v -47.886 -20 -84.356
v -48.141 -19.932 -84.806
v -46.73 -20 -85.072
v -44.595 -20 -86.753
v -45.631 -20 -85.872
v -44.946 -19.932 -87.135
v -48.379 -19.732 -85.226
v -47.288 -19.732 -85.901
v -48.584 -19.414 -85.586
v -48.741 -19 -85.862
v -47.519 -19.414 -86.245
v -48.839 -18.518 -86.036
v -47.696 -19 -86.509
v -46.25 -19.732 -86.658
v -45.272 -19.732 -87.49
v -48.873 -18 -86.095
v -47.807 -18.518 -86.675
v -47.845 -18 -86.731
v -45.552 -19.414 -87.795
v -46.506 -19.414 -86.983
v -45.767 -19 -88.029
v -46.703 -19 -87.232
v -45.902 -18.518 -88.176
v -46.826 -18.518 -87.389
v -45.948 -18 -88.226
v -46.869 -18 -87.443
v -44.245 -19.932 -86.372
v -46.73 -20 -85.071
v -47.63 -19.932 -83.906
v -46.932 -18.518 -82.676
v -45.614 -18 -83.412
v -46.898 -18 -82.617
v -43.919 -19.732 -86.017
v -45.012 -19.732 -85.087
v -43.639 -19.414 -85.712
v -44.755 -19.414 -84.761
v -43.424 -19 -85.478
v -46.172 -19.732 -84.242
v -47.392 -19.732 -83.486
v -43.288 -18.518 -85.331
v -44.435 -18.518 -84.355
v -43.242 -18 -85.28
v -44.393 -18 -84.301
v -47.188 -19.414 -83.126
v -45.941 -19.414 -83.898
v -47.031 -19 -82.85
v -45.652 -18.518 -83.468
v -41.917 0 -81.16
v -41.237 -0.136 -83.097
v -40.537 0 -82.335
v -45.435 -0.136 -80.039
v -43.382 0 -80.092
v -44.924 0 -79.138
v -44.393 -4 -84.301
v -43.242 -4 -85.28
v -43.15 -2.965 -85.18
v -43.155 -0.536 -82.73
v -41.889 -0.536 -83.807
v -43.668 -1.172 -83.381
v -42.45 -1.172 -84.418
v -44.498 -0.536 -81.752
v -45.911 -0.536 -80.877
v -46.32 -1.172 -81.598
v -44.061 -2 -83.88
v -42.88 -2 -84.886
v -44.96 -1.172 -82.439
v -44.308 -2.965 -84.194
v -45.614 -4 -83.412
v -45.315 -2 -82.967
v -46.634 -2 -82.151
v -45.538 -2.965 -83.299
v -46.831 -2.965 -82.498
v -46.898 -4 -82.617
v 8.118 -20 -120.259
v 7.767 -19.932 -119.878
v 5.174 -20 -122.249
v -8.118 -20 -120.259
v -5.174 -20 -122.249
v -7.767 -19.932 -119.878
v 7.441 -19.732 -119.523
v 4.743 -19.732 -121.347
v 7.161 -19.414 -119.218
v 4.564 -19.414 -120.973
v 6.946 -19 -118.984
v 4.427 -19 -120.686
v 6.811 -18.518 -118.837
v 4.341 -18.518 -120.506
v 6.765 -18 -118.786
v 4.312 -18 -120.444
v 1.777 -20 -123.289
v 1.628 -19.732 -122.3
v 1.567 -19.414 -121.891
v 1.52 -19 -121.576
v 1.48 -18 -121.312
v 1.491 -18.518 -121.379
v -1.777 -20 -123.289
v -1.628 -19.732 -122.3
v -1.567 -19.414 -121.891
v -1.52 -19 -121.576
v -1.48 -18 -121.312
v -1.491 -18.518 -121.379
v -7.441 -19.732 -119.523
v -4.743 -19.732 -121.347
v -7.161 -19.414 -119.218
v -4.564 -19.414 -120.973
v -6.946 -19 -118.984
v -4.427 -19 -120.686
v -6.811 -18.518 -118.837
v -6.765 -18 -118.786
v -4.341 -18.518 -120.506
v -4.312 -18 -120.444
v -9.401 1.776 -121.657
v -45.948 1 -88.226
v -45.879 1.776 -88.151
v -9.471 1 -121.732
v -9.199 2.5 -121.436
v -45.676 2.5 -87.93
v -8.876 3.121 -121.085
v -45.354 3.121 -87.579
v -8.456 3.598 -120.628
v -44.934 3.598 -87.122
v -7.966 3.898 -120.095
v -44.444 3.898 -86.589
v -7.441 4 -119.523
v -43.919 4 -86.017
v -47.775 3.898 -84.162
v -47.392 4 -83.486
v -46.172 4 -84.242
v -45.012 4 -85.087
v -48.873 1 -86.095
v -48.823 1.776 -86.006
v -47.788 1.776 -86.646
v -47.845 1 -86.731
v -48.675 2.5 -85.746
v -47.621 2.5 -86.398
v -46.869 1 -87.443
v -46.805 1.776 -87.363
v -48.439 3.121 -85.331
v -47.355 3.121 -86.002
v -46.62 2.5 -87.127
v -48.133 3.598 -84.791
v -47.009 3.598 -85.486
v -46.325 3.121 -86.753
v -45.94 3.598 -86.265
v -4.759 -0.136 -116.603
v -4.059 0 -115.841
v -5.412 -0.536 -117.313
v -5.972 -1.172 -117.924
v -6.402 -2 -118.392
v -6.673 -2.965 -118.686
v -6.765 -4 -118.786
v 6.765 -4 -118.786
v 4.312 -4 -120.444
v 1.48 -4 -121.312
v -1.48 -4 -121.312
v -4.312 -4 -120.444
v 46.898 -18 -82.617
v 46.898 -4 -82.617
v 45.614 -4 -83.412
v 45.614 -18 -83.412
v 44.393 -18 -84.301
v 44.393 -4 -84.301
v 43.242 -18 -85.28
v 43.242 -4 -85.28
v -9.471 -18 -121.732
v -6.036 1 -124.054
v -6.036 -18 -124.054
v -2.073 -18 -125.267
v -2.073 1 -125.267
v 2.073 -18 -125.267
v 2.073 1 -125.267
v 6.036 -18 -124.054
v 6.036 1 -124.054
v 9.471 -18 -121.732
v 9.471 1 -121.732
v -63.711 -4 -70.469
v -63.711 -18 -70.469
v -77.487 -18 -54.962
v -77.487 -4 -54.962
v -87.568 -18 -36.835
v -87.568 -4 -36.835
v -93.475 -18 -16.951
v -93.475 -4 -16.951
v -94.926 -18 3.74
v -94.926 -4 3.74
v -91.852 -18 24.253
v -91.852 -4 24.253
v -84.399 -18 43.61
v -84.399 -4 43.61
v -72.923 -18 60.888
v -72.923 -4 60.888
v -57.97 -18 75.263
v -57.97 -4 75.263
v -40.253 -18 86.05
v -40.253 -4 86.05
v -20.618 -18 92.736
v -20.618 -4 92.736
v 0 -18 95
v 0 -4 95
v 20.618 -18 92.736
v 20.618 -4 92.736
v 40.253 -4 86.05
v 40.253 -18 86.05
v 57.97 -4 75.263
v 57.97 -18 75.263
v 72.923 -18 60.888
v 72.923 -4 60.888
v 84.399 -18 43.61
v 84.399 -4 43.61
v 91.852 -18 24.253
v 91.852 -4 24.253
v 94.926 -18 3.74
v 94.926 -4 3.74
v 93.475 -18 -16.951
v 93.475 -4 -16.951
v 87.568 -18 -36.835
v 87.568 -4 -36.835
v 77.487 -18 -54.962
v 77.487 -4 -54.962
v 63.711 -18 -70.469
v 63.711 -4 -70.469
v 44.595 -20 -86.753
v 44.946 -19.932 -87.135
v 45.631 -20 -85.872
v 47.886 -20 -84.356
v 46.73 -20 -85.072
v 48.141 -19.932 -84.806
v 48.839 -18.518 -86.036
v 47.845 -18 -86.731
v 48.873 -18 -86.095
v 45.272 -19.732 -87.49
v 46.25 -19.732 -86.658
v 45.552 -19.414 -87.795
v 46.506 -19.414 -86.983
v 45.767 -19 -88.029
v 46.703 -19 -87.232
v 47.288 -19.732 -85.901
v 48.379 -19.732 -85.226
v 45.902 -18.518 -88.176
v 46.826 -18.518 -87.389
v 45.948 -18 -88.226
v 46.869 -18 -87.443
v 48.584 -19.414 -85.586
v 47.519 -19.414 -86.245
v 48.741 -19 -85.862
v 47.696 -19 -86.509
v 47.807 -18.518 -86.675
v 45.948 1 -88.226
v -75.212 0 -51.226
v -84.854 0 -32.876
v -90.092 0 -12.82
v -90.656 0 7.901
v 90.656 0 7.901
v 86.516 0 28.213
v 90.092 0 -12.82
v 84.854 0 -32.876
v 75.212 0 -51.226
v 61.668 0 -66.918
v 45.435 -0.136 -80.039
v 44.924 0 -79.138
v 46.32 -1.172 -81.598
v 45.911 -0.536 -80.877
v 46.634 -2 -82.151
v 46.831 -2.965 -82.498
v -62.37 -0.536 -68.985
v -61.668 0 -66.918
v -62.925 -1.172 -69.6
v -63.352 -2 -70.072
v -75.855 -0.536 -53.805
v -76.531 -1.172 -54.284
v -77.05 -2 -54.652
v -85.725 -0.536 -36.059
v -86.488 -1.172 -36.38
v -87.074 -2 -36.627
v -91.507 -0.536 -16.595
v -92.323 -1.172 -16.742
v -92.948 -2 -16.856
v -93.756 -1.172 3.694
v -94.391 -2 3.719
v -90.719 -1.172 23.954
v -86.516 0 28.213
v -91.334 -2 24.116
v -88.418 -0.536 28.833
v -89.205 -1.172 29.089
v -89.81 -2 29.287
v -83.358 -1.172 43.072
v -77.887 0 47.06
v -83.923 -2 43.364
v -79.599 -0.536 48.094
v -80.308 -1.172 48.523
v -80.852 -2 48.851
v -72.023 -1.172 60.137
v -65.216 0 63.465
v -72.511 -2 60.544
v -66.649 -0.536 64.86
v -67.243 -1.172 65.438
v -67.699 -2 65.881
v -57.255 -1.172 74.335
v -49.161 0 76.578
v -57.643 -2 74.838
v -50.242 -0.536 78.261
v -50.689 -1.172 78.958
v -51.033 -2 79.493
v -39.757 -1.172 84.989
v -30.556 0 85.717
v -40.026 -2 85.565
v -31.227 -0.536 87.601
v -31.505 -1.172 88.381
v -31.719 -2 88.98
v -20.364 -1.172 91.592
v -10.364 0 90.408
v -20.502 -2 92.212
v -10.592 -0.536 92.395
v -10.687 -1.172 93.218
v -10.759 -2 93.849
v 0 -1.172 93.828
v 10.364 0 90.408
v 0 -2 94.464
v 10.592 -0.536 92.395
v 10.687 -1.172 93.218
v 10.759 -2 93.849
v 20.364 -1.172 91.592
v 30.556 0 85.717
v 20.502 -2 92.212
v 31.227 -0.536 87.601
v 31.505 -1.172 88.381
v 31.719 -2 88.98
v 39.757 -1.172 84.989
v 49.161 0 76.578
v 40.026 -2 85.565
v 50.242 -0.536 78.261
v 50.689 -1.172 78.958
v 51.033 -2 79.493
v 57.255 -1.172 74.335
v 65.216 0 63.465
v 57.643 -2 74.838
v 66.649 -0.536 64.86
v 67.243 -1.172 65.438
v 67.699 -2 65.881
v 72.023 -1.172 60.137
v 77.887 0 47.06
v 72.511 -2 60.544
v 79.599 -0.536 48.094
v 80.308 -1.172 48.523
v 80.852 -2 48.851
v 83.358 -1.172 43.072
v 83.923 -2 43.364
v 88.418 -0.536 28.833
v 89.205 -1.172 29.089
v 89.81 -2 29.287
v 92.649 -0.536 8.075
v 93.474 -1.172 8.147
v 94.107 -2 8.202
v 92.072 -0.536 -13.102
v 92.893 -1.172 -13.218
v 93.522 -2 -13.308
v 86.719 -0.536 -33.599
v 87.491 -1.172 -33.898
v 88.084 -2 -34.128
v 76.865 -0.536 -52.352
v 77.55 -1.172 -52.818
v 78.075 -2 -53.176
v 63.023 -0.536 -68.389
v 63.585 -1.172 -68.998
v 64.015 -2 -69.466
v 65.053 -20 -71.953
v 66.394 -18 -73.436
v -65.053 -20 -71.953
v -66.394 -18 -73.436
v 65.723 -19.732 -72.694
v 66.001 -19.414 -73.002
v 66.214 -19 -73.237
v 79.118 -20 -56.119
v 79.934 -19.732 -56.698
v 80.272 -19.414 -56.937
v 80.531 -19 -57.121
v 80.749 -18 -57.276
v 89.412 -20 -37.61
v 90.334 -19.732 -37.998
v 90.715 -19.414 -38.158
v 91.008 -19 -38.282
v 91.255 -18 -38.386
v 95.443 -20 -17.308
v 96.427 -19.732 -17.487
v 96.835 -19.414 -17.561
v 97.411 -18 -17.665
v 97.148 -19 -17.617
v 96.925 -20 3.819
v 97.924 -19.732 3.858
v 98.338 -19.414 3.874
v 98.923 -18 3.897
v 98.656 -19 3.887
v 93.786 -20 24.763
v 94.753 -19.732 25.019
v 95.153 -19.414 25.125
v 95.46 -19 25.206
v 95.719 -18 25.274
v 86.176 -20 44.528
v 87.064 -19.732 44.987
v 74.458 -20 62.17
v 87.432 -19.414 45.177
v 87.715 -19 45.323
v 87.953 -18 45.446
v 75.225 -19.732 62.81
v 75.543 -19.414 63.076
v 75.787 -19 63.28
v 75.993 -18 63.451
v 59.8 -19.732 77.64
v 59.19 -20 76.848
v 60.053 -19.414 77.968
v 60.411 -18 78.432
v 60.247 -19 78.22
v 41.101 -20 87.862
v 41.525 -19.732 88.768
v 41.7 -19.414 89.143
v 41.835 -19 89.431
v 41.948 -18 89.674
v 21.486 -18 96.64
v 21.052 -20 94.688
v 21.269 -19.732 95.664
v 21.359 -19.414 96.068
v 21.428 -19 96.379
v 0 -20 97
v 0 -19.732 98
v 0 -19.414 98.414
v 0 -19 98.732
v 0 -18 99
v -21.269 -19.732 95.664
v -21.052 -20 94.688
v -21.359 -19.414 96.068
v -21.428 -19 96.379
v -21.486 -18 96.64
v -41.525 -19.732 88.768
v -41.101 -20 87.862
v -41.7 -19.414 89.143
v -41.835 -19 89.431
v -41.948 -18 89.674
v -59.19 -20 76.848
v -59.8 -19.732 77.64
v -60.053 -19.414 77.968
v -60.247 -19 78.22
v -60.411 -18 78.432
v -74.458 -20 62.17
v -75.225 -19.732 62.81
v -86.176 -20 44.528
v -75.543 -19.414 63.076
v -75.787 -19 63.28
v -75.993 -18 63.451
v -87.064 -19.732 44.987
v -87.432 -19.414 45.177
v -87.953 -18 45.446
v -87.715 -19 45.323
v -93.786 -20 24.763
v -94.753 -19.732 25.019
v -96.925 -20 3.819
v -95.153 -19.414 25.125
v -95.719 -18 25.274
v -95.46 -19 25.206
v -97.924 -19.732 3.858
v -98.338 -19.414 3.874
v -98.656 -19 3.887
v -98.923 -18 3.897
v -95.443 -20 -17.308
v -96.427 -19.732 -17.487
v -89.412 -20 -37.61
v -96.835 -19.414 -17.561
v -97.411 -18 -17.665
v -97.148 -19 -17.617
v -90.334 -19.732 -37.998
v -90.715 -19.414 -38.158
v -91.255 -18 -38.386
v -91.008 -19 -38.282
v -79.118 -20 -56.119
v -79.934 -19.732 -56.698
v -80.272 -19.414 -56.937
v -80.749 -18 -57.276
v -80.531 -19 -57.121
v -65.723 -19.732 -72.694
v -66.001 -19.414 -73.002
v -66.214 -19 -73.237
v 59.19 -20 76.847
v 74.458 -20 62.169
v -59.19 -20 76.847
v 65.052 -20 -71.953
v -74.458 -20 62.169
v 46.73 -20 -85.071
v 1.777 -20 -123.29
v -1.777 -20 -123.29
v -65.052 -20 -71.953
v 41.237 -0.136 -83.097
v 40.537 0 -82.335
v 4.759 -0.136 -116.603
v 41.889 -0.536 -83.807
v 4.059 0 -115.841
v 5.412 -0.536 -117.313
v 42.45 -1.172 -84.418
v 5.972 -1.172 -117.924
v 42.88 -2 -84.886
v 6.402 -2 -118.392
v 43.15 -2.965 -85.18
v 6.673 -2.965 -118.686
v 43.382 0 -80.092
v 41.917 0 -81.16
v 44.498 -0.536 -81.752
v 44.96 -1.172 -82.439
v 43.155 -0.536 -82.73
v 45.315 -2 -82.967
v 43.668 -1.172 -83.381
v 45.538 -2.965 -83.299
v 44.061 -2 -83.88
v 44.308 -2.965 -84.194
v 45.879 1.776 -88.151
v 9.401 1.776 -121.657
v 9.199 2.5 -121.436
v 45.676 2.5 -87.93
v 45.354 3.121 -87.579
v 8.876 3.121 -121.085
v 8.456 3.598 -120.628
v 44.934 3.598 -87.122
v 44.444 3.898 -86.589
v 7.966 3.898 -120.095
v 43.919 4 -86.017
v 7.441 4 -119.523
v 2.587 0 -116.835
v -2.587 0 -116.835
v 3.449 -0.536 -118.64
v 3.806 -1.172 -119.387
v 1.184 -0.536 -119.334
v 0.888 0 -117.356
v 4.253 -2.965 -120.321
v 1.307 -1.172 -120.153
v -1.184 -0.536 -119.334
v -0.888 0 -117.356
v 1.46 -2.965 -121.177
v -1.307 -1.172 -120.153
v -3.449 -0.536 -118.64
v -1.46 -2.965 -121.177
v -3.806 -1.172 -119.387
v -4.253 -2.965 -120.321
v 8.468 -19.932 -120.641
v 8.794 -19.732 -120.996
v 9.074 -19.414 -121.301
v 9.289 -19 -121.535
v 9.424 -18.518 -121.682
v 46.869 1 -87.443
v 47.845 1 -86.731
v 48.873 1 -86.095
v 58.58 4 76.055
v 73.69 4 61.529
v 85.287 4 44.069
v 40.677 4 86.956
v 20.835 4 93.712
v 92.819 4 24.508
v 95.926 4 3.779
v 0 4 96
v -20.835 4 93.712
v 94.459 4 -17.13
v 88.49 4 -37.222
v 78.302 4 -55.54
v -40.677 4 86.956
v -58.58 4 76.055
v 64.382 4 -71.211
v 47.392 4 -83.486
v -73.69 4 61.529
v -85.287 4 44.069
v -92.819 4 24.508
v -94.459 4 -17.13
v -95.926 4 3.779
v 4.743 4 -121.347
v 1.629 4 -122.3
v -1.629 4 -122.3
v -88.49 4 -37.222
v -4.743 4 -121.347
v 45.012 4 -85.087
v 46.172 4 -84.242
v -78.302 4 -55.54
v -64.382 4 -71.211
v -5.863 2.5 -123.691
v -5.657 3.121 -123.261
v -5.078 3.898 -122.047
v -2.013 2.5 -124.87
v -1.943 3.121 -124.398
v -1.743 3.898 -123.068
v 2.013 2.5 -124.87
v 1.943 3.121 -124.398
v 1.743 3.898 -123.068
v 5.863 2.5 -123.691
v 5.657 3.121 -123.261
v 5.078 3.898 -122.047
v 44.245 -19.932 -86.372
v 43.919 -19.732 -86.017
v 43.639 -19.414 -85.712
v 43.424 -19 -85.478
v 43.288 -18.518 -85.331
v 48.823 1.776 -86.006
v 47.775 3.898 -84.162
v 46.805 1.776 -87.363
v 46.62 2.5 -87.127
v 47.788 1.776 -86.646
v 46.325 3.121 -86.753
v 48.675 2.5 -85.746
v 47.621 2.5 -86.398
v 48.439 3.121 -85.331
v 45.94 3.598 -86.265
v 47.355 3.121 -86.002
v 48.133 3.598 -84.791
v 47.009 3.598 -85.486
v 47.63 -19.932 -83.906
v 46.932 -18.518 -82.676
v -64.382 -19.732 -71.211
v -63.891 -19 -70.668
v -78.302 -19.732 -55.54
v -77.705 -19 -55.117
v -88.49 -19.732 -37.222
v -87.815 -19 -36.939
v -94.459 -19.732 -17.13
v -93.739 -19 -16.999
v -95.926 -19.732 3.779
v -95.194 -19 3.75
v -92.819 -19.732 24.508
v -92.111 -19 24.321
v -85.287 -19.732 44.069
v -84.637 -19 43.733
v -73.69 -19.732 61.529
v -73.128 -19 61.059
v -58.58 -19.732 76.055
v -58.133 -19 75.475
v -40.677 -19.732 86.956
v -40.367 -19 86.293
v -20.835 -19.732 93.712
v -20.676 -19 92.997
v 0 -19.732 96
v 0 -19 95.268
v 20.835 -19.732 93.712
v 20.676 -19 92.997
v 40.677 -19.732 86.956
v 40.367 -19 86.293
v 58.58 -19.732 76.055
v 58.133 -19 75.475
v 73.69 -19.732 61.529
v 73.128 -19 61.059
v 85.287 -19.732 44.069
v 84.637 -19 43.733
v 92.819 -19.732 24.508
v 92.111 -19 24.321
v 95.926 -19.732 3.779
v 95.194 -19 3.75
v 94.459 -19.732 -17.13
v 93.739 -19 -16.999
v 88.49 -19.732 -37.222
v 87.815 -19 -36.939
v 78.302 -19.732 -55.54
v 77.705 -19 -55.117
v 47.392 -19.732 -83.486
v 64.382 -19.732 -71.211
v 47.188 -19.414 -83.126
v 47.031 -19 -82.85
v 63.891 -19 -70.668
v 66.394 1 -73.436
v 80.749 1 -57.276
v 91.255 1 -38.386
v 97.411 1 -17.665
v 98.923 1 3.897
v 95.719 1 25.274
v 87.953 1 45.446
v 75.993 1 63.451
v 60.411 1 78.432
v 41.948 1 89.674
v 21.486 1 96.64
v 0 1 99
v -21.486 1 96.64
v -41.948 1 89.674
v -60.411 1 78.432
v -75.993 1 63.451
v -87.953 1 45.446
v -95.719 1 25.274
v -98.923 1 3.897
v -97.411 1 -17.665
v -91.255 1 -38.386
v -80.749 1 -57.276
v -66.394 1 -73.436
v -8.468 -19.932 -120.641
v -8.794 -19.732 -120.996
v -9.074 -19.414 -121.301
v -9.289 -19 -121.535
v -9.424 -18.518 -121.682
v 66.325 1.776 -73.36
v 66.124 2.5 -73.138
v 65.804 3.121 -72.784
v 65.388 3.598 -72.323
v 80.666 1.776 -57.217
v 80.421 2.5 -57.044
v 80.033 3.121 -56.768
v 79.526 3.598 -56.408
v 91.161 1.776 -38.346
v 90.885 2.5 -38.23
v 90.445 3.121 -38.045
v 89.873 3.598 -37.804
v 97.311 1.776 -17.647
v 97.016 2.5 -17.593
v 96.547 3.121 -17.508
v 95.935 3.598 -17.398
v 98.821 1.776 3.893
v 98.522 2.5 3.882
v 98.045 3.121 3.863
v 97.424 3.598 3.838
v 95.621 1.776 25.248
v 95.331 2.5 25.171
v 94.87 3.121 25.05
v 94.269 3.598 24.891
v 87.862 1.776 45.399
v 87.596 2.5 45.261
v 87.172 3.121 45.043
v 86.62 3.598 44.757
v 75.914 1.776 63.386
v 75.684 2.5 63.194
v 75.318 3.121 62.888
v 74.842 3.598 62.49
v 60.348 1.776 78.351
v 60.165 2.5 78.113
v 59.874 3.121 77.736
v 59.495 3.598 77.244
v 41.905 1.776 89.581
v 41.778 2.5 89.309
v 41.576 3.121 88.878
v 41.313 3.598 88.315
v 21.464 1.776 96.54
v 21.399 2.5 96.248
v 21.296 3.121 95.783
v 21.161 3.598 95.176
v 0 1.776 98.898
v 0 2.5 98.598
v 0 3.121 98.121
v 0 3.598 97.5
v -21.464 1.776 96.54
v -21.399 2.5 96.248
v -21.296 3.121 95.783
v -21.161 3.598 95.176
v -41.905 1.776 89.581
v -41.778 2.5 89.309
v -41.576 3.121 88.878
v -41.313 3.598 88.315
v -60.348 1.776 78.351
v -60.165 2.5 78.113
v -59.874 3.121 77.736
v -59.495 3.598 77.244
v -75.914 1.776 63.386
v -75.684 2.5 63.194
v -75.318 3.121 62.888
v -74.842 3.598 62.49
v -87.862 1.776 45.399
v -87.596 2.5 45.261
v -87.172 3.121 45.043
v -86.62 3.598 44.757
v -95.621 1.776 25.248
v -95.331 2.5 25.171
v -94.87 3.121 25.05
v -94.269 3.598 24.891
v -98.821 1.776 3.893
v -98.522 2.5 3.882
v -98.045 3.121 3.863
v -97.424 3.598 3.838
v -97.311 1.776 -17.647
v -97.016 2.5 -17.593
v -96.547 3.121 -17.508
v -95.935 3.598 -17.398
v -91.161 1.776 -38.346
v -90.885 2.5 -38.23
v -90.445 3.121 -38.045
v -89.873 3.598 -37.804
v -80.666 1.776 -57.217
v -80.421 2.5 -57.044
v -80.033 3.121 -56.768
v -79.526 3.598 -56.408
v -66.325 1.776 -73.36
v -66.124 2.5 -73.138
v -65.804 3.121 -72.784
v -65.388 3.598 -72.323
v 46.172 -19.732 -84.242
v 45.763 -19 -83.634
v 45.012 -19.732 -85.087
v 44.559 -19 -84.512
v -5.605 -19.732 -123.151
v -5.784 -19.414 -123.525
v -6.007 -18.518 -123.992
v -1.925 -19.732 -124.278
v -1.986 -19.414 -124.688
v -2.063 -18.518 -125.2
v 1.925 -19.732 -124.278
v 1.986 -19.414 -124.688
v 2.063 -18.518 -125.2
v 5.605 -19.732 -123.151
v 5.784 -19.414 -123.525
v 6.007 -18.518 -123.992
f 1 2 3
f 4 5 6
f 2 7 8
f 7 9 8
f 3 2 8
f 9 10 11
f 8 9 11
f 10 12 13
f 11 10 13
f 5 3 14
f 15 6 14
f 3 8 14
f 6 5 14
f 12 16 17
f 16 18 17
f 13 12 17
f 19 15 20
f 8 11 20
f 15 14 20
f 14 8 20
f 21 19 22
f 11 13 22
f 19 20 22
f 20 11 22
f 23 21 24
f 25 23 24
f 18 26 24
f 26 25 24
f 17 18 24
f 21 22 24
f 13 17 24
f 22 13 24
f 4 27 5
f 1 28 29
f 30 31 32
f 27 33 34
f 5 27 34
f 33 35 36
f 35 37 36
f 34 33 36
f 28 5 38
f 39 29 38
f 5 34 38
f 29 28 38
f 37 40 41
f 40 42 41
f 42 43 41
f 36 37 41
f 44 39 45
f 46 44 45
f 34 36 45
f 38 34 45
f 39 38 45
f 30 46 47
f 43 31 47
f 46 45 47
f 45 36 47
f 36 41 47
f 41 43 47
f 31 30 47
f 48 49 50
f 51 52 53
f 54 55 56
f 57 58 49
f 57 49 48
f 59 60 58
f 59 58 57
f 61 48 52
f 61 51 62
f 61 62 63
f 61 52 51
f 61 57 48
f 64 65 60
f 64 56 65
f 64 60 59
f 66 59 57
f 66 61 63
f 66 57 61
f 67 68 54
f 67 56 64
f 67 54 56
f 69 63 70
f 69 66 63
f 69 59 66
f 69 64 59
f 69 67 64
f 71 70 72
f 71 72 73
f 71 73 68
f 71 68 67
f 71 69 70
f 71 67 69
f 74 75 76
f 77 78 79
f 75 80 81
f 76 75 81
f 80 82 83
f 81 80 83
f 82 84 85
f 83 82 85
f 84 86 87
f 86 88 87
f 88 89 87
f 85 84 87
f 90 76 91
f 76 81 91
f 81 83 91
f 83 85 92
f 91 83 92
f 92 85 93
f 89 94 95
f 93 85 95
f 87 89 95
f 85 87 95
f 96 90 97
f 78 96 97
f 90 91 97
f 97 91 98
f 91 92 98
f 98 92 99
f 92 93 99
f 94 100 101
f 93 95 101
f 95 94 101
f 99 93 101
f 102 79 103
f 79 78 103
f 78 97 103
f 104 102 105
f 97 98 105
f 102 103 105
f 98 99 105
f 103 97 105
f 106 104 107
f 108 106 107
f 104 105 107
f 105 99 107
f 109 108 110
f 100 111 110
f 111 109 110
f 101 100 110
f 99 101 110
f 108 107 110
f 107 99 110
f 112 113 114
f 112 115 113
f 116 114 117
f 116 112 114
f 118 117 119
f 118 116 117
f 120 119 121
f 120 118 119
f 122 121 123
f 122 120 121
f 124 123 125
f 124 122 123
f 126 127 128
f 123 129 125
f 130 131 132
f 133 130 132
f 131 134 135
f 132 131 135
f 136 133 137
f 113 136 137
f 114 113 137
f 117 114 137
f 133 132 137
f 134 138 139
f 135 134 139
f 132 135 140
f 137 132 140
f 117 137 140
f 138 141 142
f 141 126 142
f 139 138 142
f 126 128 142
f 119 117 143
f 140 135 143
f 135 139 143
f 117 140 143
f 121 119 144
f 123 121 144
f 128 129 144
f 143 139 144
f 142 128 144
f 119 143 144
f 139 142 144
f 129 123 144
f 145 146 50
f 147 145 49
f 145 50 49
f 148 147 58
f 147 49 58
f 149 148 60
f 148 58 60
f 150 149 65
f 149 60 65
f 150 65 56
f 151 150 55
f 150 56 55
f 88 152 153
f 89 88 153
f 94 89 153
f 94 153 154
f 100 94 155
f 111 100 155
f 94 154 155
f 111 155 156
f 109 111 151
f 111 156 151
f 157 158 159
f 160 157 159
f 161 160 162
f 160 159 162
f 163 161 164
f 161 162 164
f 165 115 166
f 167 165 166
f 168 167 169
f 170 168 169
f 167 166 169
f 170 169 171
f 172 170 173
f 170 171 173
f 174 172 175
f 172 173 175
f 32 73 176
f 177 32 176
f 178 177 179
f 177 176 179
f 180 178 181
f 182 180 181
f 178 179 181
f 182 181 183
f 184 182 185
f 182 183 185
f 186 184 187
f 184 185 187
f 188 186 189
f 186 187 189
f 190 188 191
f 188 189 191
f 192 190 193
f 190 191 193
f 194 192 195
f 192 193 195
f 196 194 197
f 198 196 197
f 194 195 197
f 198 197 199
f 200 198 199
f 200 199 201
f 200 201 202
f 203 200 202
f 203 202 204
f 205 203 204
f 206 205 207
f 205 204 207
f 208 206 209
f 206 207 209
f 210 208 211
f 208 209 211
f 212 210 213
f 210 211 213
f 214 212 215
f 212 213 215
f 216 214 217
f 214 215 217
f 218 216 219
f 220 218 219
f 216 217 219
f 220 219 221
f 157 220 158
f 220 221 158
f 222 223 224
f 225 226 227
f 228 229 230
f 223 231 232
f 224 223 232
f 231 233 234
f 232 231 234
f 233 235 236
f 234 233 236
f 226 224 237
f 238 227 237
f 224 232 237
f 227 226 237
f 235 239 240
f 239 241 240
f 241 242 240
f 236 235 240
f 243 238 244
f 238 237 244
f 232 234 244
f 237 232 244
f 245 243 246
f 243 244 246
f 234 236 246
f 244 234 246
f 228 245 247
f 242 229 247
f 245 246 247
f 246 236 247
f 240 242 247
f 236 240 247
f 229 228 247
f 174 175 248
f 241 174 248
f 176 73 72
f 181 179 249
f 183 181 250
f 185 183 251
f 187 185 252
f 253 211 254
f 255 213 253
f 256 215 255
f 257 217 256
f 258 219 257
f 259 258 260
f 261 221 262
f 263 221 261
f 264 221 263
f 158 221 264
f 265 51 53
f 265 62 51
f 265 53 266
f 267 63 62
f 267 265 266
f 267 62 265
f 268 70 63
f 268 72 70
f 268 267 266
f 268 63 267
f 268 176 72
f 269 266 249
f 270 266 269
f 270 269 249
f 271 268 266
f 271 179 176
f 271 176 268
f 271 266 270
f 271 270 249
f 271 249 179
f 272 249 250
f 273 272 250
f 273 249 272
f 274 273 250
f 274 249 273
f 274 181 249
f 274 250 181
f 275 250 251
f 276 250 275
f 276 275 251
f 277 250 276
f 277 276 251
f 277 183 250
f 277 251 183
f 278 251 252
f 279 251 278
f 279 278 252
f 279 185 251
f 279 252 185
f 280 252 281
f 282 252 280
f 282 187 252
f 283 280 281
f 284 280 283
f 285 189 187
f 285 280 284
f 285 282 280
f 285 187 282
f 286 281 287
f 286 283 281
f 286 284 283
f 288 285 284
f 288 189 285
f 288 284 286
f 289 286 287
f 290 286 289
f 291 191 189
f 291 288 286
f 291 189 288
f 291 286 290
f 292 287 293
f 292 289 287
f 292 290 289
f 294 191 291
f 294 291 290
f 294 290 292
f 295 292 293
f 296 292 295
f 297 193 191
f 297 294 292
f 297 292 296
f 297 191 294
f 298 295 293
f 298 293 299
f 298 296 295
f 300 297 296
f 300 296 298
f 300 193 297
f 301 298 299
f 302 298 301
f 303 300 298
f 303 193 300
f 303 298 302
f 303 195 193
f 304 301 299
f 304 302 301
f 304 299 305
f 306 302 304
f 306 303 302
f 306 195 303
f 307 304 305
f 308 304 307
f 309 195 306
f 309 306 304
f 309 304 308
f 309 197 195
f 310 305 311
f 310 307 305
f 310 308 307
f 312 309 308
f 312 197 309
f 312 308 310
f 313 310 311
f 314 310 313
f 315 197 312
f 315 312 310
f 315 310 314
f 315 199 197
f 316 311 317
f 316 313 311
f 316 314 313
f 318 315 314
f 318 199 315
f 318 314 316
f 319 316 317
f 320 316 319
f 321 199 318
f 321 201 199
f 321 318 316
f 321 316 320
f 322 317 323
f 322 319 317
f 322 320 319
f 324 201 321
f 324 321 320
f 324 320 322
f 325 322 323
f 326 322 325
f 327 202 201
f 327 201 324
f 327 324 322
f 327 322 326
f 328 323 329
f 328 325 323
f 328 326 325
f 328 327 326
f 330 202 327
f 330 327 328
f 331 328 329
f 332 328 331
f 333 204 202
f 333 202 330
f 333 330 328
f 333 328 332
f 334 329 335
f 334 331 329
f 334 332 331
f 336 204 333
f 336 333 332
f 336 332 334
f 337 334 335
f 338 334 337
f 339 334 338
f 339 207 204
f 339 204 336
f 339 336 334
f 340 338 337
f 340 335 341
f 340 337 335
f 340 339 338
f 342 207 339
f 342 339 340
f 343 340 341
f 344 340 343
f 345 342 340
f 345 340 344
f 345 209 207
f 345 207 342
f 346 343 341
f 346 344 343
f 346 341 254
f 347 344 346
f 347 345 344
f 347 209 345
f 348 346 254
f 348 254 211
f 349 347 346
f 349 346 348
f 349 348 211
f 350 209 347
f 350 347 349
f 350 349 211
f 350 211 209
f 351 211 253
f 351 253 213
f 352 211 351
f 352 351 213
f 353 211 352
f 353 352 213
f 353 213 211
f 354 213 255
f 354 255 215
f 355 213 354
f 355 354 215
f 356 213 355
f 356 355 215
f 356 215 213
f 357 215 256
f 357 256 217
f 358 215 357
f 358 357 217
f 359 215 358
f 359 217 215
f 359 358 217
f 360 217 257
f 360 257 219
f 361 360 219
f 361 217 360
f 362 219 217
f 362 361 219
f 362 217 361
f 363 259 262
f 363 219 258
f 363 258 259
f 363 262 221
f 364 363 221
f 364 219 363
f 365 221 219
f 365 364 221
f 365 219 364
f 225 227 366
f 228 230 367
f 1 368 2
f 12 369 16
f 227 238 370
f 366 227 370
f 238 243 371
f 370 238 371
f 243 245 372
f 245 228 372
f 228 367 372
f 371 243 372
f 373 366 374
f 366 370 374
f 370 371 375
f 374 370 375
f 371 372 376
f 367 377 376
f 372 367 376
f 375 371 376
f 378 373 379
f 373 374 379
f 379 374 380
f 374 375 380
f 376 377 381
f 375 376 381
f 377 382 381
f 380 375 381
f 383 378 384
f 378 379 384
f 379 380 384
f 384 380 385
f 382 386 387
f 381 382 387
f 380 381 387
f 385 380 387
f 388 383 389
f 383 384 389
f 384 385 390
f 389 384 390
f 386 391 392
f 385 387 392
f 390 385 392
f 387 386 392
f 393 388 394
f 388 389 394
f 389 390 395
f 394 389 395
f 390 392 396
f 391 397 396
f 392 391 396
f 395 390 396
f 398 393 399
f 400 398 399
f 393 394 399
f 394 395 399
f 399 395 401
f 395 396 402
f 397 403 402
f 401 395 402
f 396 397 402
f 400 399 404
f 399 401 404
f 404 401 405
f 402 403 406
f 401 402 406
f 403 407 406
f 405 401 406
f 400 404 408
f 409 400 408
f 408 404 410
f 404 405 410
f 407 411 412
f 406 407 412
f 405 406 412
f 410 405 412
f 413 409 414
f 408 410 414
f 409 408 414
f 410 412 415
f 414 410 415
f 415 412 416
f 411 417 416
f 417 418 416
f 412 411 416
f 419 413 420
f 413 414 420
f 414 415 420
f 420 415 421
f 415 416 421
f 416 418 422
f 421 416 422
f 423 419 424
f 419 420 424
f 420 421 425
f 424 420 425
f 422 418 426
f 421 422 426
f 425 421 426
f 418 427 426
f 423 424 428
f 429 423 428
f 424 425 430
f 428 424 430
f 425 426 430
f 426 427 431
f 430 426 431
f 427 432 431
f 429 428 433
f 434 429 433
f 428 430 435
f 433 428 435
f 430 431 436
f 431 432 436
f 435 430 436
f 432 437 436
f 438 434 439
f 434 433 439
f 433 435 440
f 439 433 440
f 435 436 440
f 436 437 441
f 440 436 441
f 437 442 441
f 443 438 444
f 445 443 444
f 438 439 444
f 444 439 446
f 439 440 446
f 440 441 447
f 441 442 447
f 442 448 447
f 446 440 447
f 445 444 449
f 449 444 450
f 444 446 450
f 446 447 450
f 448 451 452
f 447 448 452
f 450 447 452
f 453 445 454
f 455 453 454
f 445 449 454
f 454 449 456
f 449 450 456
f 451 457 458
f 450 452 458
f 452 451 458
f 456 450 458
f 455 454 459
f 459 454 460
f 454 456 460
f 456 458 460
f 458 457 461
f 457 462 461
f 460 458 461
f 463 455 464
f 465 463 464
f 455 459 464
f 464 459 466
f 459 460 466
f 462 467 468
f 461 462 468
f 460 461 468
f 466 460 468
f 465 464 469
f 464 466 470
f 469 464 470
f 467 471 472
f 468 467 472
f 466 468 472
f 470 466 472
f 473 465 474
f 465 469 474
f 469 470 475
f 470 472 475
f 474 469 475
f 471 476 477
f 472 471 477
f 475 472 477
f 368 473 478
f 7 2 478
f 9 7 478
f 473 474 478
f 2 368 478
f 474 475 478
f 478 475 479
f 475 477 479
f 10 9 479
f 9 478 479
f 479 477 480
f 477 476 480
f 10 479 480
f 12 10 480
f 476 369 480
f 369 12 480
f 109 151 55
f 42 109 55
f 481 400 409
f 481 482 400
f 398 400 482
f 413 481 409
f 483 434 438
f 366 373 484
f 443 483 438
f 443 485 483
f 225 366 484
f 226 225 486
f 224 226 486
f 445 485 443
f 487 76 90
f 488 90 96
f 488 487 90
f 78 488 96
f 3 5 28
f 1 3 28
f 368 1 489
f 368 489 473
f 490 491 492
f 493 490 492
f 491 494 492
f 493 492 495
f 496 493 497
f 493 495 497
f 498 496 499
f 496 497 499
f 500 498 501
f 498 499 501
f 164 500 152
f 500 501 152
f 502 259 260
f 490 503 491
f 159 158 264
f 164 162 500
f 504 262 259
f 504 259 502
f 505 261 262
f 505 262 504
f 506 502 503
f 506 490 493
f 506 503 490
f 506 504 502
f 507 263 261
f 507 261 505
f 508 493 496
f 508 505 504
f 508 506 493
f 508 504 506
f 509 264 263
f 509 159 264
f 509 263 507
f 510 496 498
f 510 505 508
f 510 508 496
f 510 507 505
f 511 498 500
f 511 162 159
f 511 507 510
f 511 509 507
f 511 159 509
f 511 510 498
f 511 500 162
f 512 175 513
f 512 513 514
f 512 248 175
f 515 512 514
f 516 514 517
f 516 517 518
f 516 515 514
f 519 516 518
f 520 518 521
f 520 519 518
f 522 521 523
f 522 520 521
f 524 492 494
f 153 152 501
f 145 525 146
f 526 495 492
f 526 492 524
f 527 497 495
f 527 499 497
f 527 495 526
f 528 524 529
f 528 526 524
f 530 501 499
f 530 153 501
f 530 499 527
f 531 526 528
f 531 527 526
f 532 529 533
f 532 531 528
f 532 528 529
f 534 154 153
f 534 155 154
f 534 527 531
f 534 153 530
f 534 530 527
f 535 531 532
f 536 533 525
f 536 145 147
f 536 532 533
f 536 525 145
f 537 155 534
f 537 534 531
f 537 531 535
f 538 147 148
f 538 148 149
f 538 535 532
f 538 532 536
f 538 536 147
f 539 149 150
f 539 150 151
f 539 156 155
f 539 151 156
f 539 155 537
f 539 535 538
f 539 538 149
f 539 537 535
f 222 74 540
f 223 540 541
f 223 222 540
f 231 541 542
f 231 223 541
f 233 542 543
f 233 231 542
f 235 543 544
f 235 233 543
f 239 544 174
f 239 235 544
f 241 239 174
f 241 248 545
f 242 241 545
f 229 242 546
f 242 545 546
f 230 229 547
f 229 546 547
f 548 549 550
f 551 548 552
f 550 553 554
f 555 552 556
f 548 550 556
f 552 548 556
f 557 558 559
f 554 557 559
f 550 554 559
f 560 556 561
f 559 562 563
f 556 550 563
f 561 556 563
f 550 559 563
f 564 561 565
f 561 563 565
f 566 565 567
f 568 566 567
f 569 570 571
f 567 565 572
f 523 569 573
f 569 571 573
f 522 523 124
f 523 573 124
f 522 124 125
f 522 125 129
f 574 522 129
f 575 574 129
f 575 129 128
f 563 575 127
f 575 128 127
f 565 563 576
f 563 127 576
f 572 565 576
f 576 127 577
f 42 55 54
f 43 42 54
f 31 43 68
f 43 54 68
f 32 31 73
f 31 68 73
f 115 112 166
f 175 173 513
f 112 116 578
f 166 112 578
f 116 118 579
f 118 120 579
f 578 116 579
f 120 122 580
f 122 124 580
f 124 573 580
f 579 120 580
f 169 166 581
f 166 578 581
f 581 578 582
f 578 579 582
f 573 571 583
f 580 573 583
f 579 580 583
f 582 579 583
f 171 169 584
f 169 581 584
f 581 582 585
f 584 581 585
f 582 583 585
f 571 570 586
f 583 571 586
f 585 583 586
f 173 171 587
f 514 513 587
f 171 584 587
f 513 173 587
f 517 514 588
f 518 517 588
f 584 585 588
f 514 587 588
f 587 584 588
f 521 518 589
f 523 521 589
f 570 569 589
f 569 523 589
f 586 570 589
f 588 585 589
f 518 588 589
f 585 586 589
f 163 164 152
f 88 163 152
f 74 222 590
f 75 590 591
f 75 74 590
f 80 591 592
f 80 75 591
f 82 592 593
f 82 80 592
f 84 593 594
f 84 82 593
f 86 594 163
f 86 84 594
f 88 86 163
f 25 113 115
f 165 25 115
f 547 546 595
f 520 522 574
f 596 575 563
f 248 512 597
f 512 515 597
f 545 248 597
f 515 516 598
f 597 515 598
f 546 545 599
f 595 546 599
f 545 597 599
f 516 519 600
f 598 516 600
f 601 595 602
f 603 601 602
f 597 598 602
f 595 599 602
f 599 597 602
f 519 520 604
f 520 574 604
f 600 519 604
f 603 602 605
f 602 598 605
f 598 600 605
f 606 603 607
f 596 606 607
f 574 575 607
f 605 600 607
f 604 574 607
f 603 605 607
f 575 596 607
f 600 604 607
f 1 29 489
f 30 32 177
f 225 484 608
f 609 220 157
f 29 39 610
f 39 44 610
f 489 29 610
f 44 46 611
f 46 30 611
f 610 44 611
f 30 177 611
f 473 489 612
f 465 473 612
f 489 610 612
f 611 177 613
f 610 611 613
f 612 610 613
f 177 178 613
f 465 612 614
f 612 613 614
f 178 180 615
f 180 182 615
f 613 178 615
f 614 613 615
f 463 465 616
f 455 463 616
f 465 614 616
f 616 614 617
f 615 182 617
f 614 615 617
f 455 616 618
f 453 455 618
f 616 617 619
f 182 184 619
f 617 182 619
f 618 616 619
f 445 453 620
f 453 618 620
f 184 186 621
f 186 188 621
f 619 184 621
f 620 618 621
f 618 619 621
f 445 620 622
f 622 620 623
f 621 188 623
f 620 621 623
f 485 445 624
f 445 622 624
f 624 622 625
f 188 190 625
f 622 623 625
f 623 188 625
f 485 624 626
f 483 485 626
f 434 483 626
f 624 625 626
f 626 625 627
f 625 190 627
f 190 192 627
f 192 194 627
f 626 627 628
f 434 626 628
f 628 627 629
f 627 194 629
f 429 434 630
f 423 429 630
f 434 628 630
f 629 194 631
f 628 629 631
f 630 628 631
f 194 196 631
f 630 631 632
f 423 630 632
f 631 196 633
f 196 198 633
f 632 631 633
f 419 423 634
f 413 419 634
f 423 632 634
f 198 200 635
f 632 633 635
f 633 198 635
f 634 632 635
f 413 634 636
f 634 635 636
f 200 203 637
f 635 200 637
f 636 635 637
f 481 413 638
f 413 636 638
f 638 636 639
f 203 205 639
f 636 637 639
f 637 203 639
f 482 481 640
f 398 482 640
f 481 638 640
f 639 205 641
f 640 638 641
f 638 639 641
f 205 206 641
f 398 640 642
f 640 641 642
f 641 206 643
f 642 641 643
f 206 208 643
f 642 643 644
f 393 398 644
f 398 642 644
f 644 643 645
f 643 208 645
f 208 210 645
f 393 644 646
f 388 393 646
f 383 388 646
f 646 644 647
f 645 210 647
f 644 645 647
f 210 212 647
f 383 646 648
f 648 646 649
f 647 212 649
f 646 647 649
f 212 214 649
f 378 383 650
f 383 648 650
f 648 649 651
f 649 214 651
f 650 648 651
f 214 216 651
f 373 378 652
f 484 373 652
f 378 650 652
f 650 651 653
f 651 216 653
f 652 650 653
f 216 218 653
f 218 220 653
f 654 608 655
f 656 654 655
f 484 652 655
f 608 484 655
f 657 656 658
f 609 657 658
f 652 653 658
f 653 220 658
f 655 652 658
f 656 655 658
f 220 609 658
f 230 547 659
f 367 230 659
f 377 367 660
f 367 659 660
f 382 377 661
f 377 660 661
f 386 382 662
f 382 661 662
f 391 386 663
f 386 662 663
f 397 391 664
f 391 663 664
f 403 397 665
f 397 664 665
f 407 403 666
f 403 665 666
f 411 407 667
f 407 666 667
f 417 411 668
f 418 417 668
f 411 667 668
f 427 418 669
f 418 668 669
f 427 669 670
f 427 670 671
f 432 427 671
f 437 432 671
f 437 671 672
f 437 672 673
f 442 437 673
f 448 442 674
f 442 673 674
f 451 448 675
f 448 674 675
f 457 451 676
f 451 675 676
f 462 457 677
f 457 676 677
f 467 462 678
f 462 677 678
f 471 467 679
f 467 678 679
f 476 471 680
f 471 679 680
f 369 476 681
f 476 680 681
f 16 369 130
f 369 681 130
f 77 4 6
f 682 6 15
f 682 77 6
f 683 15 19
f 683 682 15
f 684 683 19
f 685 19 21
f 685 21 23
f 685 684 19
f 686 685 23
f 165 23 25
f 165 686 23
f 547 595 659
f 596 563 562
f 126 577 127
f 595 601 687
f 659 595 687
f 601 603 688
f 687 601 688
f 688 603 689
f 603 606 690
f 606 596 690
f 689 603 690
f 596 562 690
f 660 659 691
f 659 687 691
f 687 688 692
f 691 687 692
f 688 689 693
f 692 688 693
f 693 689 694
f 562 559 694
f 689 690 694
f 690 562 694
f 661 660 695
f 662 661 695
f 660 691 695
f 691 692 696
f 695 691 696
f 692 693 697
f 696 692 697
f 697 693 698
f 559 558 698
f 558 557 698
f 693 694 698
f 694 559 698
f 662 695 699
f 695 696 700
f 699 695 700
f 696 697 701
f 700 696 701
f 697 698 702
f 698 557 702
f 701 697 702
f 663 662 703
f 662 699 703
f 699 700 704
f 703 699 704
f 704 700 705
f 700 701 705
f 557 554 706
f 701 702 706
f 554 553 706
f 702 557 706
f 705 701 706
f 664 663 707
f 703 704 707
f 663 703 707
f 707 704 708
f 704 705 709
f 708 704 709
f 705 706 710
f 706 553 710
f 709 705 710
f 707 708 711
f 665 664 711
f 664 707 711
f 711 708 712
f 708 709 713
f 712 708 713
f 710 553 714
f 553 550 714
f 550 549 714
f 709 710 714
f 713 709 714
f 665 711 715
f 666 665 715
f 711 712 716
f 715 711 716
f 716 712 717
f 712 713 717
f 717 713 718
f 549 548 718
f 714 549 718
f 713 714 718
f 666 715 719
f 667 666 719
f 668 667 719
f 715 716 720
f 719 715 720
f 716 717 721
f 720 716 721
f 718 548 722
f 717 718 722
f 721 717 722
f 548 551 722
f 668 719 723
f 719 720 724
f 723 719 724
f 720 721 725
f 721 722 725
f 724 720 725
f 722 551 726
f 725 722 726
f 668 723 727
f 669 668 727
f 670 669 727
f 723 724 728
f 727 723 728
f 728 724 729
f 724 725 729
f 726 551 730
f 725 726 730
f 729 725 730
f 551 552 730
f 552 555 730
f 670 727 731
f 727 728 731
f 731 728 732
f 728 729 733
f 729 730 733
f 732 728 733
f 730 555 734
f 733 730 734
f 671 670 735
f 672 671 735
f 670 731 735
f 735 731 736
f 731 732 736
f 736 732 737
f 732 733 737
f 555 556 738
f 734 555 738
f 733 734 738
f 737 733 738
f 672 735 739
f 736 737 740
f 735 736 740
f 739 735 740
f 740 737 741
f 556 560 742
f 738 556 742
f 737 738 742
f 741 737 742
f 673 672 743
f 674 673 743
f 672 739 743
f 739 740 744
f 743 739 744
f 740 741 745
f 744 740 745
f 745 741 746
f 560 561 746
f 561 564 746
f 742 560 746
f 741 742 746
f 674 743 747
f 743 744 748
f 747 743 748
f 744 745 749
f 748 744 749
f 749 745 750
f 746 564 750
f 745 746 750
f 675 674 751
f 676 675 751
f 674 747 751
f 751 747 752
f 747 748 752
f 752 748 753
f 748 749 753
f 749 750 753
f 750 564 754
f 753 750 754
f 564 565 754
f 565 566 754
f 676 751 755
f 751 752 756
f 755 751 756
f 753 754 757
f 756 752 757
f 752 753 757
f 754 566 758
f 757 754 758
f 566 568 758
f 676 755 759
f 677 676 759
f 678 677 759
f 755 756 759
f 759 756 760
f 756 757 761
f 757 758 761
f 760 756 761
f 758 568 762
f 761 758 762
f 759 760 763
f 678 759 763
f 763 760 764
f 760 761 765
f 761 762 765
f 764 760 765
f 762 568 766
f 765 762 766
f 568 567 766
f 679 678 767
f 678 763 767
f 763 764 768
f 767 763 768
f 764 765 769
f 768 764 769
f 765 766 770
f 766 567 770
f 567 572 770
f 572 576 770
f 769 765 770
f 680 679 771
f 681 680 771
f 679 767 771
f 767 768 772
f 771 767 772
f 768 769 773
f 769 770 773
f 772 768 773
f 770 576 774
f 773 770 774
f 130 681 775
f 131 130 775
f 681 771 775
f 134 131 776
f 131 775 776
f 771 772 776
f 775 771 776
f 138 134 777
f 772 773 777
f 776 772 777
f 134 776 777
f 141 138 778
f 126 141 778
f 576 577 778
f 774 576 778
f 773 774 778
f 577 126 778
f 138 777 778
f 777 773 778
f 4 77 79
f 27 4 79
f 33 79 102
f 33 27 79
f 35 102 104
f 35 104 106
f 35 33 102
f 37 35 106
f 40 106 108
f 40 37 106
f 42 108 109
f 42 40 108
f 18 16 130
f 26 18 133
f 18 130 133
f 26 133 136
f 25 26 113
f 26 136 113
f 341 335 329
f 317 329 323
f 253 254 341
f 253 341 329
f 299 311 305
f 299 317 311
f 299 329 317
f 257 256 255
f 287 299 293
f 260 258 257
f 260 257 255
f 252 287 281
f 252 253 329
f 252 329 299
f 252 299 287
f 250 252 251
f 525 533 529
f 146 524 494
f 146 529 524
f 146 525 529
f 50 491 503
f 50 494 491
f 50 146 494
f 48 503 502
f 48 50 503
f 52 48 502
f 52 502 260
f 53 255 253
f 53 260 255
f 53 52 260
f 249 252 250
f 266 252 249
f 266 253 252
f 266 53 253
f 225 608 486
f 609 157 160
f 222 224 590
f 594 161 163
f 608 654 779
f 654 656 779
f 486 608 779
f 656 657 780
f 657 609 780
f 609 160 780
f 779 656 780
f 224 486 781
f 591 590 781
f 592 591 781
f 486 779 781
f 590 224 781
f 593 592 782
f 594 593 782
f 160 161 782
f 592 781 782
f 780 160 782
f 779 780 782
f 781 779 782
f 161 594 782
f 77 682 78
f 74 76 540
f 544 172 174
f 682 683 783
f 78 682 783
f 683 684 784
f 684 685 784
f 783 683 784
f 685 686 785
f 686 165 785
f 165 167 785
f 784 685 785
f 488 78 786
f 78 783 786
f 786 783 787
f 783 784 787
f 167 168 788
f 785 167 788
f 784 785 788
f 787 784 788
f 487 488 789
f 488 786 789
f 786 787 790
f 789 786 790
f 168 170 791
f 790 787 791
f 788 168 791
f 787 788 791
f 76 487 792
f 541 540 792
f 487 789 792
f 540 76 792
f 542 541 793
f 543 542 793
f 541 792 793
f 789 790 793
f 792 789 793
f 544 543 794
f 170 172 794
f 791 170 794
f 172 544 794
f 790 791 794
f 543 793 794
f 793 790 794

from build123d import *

# Parameters (mm, degrees)
BOSS_EXTRUDE1_DEPTH = 20
BOSS_EXTRUDE2_START = 4
BOSS_EXTRUDE2_DEPTH = 4
FILLET1_R           = 4
FILLET2_R           = 3
FILLET3_R           = 2


with BuildPart() as part:
    # Sketch2 → Boss-Extrude1 (new body)
    with BuildSketch(Plane(origin=(0, 0, 0), x_dir=(1, 0, 0), z_dir=(0, 1, 0))):
        with BuildLine():
            Line((9.470598027, 121.732262156), (45.948280407, 88.226297118))
            ThreePointArc((45.948280407, 88.226297118), (47.350268632, 87.077889107), (48.873132869, 86.09539409))
            ThreePointArc((48.873132869, 86.09539409), (0, -99), (-48.873132869, 86.09539409))
            ThreePointArc((-48.873132869, 86.09539409), (-47.350268632, 87.077889107), (-45.948280407, 88.226297118))
            Line((-45.948280407, 88.226297118), (-9.470598027, 121.732262156))
            ThreePointArc((-9.470598027, 121.732262156), (0, 125.42169607), (9.470598027, 121.732262156))
        make_face()
        with BuildLine():
            Line((-6.764712877, 118.786386131), (-43.242395256, 85.280421094))
            ThreePointArc((-43.242395256, 85.280421094), (-44.994880537, 83.84491108), (-46.898460834, 82.616792309))
            ThreePointArc((-46.898460834, 82.616792309), (0, -95), (46.898460834, 82.616792309))
            ThreePointArc((46.898460834, 82.616792309), (44.994880537, 83.84491108), (43.242395256, 85.280421094))
            Line((43.242395256, 85.280421094), (6.764712877, 118.786386131))
            ThreePointArc((6.764712877, 118.786386131), (0, 121.42169607), (-6.764712877, 118.786386131))
        make_face(mode=Mode.SUBTRACT)
    extrude(amount=-BOSS_EXTRUDE1_DEPTH)

    # Sketch2<2> → Boss-Extrude2 (add)
    with BuildSketch(Plane(origin=(0, 0, 0), x_dir=(1, 0, 0), z_dir=(0, 1, 0)).offset(BOSS_EXTRUDE2_START)):
        with BuildLine():
            Line((9.470598027, 121.732262156), (45.948280407, 88.226297118))
            ThreePointArc((45.948280407, 88.226297118), (47.350268632, 87.077889107), (48.873132869, 86.09539409))
            ThreePointArc((48.873132869, 86.09539409), (0, -99), (-48.873132869, 86.09539409))
            ThreePointArc((-48.873132869, 86.09539409), (-47.350268632, 87.077889107), (-45.948280407, 88.226297118))
            Line((-45.948280407, 88.226297118), (-9.470598027, 121.732262156))
            ThreePointArc((-9.470598027, 121.732262156), (0, 125.42169607), (9.470598027, 121.732262156))
        make_face()
    extrude(amount=-BOSS_EXTRUDE2_DEPTH)

    # Fillet1
    fillet1_edges = [part.edges().sort_by_distance(p)[0] for p in [
        (44.994880537, 0, -83.84491108),
        (25.003554066, 0, -102.033403612),
        (0, 0, -121.42169607),
        (-25.003554066, 0, -102.033403612),
        (-44.994880537, 0, -83.84491108),
        (0, 0, 95),
    ]]
    fillet(fillet1_edges, radius=FILLET1_R)

    # Fillet2
    fillet2_edges = [part.edges().sort_by_distance(p)[0] for p in [
        (-47.350268632, 4, -87.077889107),
        (27.709439217, 4, -104.979279637),
        (0, 4, -125.42169607),
        (0, 4, 99),
        (47.350268632, 4, -87.077889107),
        (-27.709439217, 4, -104.979279637),
    ]]
    fillet(fillet2_edges, radius=FILLET2_R)

    # Fillet3
    fillet3_edges = [part.edges().sort_by_distance(p)[0] for p in [
        (47.350268632, -20, -87.077889107),
        (27.709439217, -20, -104.979279637),
        (0, -20, -125.42169607),
        (44.994880537, -20, -83.84491108),
        (0, -20, 95),
        (-44.994880537, -20, -83.84491108),
        (-25.003554066, -20, -102.033403612),
        (0, -20, -121.42169607),
        (25.003554066, -20, -102.033403612),
        (-27.709439217, -20, -104.979279637),
        (-47.350268632, -20, -87.077889107),
        (0, -20, 99),
    ]]
    fillet(fillet3_edges, radius=FILLET3_R - 0.0001)  # a hair under: the kernel refuses the full size


solid = part.part
